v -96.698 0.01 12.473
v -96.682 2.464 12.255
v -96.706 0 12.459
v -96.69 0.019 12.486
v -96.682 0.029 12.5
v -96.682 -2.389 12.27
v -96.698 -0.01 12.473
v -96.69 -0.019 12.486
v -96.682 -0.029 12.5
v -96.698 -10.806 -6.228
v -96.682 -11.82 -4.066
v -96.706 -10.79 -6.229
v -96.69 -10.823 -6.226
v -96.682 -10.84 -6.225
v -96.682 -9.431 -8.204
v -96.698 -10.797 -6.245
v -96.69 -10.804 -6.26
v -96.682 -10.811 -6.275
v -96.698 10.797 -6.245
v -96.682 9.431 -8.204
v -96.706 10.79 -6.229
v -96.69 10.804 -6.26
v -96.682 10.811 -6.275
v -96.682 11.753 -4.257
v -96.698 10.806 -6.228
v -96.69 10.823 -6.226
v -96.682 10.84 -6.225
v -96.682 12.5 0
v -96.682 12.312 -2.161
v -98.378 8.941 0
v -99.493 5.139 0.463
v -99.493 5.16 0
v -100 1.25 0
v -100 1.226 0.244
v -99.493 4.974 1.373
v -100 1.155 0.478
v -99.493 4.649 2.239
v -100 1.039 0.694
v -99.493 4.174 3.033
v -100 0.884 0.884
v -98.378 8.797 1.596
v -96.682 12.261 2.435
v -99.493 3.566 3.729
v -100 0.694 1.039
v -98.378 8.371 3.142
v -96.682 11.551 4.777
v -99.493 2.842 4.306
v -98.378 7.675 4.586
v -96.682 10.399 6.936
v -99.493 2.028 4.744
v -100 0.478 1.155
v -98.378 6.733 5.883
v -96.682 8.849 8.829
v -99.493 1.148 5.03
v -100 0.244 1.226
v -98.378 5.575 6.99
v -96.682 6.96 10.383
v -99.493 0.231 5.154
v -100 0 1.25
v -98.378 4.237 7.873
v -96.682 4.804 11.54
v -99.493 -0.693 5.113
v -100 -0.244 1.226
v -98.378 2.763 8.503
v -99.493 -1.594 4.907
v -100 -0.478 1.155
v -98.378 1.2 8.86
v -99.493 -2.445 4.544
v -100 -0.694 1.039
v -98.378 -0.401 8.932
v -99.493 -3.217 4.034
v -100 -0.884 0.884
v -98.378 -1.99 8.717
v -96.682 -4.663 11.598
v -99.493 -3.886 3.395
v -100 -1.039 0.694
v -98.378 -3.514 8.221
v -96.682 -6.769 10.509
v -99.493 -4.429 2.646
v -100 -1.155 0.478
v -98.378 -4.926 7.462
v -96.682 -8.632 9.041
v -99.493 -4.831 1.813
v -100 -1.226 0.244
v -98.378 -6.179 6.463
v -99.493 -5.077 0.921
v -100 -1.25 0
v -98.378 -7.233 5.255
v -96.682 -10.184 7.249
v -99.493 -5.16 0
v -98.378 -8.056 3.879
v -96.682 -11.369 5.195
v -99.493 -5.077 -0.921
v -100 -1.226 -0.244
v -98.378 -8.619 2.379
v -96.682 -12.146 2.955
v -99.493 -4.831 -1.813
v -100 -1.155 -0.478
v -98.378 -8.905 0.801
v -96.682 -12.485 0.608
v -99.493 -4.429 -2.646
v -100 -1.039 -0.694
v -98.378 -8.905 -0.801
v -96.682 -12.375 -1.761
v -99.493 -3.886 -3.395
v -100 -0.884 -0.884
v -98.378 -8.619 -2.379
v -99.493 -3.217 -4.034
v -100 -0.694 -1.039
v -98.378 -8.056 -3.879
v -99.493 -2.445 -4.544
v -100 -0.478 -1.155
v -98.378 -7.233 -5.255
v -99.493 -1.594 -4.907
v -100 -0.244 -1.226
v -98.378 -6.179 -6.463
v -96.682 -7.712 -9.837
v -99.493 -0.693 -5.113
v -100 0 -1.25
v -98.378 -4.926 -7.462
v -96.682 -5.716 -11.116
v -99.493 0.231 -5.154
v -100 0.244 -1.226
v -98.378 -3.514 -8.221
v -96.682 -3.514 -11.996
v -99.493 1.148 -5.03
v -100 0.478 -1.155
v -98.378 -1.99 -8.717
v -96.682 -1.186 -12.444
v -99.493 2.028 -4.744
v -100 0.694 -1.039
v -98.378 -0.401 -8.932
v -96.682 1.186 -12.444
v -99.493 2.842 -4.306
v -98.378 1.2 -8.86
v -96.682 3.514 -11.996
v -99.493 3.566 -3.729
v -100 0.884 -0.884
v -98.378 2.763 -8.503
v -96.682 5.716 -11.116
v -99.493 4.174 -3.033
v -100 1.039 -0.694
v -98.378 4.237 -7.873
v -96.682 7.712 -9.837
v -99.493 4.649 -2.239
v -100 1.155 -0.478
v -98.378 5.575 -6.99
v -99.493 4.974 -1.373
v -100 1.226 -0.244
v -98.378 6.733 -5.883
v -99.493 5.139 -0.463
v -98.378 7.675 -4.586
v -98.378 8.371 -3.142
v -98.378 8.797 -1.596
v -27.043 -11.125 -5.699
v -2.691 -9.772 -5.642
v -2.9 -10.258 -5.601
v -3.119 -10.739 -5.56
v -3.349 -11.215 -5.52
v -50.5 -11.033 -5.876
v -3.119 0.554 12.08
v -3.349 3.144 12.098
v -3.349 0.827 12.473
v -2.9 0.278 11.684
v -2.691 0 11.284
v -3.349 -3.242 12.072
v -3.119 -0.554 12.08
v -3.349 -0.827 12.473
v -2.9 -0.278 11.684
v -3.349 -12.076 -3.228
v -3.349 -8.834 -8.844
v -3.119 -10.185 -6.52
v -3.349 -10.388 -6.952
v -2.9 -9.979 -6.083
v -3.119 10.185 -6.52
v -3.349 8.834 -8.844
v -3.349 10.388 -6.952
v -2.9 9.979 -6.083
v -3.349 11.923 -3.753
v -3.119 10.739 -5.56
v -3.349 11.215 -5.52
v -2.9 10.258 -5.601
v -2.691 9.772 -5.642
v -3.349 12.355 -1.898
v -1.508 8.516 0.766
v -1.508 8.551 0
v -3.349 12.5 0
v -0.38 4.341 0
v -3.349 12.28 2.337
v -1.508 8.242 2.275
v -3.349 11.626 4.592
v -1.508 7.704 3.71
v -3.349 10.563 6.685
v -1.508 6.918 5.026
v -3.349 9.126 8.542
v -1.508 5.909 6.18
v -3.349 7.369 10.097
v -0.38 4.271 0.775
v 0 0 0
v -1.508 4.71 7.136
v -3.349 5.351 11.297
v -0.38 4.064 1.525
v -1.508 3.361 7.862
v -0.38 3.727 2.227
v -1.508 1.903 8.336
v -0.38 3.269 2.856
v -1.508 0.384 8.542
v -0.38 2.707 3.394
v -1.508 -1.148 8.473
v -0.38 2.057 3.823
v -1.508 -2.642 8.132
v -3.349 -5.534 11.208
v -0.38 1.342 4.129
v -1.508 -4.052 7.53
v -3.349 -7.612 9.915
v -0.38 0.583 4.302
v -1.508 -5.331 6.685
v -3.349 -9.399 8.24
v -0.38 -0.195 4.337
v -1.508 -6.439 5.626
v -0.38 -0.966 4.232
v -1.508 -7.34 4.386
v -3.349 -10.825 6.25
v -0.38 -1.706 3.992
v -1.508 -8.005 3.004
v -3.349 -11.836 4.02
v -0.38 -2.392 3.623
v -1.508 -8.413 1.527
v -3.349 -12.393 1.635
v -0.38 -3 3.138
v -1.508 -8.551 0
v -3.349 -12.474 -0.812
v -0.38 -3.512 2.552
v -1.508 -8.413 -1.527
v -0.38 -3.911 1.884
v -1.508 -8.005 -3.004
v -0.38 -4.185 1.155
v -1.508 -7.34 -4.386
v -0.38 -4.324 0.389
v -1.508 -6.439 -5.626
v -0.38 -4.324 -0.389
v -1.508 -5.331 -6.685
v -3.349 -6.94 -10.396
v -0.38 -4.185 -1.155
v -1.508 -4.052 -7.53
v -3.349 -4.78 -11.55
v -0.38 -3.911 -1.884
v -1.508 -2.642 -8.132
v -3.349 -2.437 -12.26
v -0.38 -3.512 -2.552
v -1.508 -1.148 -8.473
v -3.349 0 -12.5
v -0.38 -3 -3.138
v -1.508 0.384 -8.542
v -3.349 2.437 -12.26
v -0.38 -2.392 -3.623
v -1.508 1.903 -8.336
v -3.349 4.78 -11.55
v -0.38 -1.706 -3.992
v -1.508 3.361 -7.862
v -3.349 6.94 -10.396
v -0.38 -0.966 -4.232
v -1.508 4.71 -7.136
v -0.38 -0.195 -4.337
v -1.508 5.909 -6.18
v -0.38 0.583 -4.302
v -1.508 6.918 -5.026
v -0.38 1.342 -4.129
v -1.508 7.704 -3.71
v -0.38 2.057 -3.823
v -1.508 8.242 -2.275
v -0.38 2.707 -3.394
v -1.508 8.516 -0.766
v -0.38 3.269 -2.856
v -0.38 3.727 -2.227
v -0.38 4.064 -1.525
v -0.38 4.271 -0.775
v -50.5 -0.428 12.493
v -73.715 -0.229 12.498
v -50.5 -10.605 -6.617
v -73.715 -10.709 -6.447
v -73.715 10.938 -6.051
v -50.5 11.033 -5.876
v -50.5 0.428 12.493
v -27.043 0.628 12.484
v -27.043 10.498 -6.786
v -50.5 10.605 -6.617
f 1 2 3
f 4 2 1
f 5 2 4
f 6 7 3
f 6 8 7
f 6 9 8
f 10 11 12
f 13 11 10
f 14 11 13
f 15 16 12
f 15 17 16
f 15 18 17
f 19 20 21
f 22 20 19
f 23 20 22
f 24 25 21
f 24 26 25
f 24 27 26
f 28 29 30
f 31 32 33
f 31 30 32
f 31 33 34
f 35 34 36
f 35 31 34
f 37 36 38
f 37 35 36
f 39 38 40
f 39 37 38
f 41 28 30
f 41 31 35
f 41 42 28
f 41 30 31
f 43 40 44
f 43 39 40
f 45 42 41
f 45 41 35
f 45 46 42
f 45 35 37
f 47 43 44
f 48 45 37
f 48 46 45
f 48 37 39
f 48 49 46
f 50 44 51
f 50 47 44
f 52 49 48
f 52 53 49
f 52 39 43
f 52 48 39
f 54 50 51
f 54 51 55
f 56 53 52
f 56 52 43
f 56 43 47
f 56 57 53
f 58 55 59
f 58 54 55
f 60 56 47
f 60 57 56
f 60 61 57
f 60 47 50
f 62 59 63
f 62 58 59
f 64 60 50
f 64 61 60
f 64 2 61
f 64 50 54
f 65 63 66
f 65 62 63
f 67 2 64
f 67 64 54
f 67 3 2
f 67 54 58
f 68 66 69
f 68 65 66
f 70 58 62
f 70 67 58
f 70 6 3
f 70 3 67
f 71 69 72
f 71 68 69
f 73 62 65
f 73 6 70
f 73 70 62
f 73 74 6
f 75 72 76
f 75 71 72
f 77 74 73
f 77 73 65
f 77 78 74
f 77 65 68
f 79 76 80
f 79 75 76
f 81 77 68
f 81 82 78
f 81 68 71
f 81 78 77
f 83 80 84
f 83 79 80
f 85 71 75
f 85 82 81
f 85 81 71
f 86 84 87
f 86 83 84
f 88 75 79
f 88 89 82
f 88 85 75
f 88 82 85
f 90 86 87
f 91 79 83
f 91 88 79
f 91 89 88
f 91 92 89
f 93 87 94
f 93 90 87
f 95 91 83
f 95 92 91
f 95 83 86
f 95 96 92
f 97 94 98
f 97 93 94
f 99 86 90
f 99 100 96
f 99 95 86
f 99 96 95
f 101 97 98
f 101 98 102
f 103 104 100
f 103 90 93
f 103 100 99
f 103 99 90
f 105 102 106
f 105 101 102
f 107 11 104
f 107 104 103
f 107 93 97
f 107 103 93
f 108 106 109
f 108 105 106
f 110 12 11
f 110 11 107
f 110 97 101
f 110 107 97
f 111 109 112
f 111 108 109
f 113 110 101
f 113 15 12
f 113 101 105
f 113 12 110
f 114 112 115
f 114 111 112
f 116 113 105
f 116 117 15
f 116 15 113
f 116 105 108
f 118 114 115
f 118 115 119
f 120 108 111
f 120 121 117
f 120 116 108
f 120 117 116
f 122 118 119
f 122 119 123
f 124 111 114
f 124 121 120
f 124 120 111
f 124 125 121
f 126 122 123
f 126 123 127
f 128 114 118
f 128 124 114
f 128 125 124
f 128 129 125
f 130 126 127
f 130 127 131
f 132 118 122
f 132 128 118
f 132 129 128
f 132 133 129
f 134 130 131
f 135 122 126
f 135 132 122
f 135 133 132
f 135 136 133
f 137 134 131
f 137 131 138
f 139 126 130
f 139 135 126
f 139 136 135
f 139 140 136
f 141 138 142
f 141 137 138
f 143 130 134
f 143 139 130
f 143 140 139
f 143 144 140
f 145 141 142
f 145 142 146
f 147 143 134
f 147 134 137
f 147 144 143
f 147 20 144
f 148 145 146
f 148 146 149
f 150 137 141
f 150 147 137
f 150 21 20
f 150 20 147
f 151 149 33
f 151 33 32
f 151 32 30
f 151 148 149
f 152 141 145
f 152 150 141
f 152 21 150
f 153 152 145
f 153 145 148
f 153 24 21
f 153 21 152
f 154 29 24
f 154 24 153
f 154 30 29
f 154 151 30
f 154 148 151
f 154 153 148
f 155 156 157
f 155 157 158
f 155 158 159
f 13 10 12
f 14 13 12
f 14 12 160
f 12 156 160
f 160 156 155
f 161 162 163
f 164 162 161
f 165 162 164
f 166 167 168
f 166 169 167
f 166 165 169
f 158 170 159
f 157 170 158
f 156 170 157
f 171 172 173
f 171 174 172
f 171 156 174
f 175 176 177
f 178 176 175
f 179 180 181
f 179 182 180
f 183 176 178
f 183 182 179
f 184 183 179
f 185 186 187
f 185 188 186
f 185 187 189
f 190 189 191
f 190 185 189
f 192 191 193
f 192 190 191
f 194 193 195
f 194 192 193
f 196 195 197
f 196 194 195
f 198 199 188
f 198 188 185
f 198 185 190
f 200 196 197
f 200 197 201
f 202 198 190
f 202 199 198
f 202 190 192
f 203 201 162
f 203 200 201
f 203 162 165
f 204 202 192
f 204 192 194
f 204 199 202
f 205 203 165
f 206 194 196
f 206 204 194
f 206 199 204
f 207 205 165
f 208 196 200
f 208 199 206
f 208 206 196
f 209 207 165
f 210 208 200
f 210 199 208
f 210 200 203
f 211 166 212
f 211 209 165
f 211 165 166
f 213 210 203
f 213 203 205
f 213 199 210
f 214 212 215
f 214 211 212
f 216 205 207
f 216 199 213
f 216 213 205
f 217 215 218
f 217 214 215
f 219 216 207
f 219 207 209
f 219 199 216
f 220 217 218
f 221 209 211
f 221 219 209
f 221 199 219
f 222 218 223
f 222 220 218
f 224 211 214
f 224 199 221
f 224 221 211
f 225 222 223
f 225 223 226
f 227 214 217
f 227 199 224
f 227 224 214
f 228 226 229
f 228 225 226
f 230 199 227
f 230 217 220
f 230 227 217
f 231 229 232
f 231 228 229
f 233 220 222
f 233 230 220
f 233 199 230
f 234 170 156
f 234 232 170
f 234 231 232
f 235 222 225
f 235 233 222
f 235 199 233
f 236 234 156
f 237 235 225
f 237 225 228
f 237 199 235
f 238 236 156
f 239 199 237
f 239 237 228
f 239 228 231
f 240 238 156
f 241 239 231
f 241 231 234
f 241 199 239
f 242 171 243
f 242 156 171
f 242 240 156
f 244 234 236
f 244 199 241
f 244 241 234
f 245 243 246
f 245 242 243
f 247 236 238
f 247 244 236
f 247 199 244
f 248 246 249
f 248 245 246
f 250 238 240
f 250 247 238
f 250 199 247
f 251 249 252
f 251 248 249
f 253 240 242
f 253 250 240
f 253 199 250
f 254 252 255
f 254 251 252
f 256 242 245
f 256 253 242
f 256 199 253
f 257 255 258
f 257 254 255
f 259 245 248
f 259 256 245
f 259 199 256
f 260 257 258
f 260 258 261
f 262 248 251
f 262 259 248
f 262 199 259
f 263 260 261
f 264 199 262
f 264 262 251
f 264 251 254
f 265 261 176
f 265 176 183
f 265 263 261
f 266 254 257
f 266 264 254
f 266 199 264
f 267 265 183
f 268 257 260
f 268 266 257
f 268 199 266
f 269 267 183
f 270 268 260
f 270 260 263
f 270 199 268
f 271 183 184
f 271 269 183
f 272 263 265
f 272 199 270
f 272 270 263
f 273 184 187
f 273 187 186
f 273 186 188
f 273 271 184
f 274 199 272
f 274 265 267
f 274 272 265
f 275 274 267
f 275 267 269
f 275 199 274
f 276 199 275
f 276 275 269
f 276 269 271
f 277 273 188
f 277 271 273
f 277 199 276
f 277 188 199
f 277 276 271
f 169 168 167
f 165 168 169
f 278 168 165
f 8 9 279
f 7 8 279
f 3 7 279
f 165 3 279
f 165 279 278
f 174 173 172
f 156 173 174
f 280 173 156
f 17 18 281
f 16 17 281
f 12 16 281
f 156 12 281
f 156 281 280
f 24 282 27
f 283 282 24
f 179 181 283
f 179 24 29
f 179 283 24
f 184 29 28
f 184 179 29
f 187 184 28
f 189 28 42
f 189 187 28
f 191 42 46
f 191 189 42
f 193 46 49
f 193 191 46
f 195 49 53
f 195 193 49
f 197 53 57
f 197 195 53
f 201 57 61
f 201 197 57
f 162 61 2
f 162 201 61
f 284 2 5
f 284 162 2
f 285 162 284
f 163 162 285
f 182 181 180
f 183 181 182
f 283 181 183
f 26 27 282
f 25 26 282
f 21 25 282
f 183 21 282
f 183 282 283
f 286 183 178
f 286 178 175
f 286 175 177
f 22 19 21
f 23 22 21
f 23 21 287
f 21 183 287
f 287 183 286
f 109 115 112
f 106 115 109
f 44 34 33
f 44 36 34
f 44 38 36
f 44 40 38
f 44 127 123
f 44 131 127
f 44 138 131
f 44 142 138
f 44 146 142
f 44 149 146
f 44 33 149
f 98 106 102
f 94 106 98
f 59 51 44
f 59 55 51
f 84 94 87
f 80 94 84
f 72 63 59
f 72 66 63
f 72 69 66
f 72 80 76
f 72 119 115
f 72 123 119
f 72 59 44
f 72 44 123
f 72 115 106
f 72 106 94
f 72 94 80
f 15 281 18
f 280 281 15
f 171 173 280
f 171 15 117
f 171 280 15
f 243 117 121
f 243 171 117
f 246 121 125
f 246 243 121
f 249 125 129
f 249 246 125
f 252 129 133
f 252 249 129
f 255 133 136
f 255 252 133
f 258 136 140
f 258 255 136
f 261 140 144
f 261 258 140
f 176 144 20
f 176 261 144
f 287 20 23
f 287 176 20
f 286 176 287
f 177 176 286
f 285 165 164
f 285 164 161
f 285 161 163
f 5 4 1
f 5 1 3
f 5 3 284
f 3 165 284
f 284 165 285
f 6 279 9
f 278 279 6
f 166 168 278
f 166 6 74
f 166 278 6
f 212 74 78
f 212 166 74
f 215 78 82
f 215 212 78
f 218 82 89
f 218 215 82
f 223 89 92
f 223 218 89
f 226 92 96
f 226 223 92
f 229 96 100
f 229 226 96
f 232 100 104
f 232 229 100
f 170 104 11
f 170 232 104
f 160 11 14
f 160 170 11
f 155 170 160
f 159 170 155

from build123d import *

# Parameters (mm, degrees)
CIRPATTERN1_COUNT = 3


with BuildPart() as part:
    # Sketch1 → Base-Revolve (revolve)
    with BuildSketch(Plane.XY):
        with BuildLine():
            Line((-100, 0), (-100, 1.25))
            ThreePointArc((-100, 1.25), (-99.010050505, 7.072345027), (-96.68190465, 12.5))
            Line((-96.68190465, 12.5), (-3.349364905, 12.5))
            ThreePointArc((-3.349364905, 12.5), (-0.851854343, 6.470476128), (0, 0))
            Line((0, 0), (-100, 0))
        make_face()
    revolve(axis=Axis((-40, 0, 0), (1, 0, 0)))

    # Cut-Sweep1: sweep along a path in Sketch4
    with BuildLine(Plane(origin=(0, 0, 0), x_dir=(1, 0, 0), z_dir=(0, 1, 0))) as cut_sweep1_path:
        Line((0, -11.25), (-100, -12.5))
    # Sketch2 → Cut-Sweep1 (sweep, cut)
    with BuildSketch(Plane(origin=(0, 0, 0), x_dir=(0, 0, -1), z_dir=(1, 0, 0))):
        Polygon((-11.25, 0), (-12.5, 0.875259423), (-12.5, -0.875259423), align=None)
    cut_sweep1 = sweep(path=cut_sweep1_path.line, mode=Mode.SUBTRACT)

    # CirPattern1: Cut-Sweep1 ×3 about axis
    cirpattern1_axis = Axis((0, 0, 0), (1, 0, 0))
    for i in range(1, CIRPATTERN1_COUNT):
        add(cut_sweep1.rotate(cirpattern1_axis, i * 360 / CIRPATTERN1_COUNT), mode=Mode.SUBTRACT)


solid = part.part
